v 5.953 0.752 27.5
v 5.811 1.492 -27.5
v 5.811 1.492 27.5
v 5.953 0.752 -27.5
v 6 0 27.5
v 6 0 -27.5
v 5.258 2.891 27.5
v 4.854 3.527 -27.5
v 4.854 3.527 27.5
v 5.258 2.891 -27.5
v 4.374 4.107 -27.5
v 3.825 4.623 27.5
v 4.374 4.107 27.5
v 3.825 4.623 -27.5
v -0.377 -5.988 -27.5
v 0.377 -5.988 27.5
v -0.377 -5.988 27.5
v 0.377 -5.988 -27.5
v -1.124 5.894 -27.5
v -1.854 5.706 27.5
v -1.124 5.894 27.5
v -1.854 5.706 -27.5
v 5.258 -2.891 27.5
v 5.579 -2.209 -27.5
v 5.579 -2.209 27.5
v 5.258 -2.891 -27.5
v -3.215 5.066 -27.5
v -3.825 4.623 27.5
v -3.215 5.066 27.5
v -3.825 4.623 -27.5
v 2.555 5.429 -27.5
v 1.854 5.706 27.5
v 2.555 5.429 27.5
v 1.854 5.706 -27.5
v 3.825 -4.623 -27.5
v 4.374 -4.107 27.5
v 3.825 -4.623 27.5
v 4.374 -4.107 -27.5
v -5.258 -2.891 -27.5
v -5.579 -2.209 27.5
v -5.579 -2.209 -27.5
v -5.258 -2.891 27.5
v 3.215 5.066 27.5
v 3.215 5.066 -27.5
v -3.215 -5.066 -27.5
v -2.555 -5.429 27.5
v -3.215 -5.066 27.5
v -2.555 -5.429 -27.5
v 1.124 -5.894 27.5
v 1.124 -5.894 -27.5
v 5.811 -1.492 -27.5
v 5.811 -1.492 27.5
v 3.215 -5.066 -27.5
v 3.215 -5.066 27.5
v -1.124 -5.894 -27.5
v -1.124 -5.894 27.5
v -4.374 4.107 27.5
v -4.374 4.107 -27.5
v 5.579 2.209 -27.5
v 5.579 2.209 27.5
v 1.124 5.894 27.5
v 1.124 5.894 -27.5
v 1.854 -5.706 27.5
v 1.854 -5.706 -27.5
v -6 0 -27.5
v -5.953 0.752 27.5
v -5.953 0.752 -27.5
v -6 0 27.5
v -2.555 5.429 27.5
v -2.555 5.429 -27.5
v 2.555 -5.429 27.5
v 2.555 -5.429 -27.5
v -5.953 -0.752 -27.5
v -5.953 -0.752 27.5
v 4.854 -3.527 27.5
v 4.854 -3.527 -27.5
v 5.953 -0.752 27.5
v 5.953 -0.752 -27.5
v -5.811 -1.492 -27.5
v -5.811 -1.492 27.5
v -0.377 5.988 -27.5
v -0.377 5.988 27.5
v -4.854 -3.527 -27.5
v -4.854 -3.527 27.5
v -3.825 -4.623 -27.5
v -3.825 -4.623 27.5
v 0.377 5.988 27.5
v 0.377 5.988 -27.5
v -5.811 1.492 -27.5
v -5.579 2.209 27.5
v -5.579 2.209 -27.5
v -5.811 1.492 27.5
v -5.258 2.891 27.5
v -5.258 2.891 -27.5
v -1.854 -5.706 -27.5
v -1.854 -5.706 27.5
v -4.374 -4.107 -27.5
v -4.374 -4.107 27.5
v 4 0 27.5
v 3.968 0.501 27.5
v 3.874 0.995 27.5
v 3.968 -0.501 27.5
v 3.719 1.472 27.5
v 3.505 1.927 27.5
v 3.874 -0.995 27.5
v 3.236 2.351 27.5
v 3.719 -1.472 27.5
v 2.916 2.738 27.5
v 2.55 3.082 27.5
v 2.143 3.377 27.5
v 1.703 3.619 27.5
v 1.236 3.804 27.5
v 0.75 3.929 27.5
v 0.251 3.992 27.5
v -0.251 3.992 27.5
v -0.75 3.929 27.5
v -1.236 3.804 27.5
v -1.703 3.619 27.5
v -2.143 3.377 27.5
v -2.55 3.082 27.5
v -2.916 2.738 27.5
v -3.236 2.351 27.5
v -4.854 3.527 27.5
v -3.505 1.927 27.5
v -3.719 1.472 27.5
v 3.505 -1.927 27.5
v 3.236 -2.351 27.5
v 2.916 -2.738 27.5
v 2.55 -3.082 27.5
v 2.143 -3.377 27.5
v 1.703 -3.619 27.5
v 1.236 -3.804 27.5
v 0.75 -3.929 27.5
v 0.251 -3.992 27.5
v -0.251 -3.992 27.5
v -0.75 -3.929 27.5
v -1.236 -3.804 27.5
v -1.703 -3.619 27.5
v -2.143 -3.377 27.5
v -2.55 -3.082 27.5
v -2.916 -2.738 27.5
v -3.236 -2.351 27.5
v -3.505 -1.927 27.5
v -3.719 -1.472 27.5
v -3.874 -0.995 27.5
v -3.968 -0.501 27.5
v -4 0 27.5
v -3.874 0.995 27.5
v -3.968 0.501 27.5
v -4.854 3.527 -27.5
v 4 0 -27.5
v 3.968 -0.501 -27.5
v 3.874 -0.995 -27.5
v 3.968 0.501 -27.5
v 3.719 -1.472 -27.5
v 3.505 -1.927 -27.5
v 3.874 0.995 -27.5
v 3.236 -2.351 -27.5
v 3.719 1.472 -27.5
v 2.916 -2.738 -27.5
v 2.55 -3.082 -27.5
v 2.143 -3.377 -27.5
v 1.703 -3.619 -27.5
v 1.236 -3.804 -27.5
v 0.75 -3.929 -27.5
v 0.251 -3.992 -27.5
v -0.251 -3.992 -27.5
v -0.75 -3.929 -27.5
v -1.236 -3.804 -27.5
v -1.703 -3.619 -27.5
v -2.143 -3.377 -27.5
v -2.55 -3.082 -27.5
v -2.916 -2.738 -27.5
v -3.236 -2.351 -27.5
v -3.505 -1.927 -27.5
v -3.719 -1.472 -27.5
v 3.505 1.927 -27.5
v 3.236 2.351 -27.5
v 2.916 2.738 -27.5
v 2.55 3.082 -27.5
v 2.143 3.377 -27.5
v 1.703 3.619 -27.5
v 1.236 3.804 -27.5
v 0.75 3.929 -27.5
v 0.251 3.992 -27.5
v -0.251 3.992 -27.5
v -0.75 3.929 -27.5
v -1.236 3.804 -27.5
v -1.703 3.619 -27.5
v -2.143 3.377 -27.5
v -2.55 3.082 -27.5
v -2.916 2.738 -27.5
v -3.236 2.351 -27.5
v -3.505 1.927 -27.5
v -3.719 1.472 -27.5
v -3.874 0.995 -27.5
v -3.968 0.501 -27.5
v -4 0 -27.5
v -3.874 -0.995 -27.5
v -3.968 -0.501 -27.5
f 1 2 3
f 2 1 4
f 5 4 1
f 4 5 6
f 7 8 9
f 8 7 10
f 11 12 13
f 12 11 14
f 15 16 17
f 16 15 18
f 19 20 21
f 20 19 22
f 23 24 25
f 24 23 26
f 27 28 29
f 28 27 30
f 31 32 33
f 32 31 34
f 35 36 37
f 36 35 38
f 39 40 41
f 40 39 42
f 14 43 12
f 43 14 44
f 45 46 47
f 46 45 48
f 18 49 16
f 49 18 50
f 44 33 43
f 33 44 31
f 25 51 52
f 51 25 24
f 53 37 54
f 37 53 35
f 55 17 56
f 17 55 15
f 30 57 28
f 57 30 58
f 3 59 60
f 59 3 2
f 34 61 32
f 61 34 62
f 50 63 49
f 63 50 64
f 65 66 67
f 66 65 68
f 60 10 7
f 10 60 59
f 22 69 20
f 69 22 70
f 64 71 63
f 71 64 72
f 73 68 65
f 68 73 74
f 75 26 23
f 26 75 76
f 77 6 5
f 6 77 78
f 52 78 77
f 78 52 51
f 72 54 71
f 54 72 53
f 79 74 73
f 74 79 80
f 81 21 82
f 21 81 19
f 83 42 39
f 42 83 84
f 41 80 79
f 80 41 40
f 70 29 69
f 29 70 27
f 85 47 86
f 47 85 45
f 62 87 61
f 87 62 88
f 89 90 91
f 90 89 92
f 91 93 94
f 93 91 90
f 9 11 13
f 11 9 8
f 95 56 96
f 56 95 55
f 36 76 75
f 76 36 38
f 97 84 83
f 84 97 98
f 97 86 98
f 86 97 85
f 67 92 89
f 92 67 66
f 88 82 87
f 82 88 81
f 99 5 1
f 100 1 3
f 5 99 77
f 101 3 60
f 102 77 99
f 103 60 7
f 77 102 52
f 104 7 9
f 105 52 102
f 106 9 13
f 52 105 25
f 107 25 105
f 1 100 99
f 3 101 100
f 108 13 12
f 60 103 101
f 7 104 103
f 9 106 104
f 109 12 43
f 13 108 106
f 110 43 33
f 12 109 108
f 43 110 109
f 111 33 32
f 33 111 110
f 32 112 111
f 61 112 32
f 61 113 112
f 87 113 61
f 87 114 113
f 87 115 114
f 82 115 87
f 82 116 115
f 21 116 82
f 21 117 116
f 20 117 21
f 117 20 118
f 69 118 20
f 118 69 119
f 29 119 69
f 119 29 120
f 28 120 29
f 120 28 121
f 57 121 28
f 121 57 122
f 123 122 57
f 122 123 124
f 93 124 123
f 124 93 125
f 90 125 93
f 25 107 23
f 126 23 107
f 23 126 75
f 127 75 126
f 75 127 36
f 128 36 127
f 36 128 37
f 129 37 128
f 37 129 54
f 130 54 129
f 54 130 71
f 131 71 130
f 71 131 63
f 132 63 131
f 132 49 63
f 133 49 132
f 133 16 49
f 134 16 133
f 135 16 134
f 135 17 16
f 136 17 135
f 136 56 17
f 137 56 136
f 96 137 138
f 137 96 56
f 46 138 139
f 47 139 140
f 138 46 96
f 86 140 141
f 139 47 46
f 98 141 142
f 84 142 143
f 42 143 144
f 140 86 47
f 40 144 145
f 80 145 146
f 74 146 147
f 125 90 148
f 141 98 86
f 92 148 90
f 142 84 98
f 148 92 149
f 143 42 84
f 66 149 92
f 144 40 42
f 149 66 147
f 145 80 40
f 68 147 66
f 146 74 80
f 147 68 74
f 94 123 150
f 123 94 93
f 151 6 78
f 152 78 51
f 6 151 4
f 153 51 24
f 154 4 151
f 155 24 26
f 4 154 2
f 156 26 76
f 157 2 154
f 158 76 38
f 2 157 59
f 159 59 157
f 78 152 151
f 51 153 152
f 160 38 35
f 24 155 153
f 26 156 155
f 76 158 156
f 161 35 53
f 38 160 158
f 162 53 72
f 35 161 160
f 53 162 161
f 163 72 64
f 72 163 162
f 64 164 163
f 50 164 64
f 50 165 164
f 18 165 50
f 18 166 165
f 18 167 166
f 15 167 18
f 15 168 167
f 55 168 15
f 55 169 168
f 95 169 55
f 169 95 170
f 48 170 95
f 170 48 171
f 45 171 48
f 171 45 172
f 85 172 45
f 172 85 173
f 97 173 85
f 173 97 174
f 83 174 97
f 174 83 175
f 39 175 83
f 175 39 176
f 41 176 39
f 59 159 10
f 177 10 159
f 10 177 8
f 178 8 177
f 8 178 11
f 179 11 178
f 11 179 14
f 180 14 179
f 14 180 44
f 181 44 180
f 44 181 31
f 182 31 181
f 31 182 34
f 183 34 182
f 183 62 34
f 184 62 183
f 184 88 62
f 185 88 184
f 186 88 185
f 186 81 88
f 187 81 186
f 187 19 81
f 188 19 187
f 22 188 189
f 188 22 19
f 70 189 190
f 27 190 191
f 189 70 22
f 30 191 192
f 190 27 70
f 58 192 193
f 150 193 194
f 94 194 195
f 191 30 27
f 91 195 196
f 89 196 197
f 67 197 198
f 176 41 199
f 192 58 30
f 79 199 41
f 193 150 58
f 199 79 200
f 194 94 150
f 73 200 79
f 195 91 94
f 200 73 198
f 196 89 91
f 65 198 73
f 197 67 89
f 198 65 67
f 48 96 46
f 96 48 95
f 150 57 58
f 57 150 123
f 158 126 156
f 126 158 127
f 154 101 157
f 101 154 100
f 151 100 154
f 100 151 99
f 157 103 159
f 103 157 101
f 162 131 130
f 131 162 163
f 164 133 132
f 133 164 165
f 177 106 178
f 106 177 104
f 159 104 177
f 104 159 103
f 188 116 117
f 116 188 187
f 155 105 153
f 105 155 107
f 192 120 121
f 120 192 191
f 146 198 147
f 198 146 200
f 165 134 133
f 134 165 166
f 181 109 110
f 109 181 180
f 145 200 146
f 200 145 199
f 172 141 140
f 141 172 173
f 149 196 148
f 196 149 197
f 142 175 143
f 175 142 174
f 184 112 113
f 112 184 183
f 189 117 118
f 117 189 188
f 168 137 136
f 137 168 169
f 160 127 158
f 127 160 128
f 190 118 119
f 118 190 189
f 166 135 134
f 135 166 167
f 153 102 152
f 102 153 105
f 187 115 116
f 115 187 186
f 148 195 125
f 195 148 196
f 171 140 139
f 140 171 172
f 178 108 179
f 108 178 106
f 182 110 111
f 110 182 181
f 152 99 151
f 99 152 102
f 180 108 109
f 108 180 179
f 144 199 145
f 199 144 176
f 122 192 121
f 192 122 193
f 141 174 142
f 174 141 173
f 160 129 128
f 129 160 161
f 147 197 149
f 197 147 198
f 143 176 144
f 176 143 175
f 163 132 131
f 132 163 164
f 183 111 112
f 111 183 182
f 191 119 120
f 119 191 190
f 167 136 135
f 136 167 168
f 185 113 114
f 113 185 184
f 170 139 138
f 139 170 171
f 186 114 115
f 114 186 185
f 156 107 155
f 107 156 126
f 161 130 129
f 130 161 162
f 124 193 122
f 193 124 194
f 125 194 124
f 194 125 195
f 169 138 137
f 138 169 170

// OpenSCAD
$fn = 50;


difference() {
	union() {
		translate(v = [0, 0, -27.5000000000]) {
			cylinder(h = 55, r = 6.0000000000);
		}
	}
	union() {
		translate(v = [0, 0, -100.0000000000]) {
			cylinder(h = 200, r = 4.0000000000);
		}
	}
}
